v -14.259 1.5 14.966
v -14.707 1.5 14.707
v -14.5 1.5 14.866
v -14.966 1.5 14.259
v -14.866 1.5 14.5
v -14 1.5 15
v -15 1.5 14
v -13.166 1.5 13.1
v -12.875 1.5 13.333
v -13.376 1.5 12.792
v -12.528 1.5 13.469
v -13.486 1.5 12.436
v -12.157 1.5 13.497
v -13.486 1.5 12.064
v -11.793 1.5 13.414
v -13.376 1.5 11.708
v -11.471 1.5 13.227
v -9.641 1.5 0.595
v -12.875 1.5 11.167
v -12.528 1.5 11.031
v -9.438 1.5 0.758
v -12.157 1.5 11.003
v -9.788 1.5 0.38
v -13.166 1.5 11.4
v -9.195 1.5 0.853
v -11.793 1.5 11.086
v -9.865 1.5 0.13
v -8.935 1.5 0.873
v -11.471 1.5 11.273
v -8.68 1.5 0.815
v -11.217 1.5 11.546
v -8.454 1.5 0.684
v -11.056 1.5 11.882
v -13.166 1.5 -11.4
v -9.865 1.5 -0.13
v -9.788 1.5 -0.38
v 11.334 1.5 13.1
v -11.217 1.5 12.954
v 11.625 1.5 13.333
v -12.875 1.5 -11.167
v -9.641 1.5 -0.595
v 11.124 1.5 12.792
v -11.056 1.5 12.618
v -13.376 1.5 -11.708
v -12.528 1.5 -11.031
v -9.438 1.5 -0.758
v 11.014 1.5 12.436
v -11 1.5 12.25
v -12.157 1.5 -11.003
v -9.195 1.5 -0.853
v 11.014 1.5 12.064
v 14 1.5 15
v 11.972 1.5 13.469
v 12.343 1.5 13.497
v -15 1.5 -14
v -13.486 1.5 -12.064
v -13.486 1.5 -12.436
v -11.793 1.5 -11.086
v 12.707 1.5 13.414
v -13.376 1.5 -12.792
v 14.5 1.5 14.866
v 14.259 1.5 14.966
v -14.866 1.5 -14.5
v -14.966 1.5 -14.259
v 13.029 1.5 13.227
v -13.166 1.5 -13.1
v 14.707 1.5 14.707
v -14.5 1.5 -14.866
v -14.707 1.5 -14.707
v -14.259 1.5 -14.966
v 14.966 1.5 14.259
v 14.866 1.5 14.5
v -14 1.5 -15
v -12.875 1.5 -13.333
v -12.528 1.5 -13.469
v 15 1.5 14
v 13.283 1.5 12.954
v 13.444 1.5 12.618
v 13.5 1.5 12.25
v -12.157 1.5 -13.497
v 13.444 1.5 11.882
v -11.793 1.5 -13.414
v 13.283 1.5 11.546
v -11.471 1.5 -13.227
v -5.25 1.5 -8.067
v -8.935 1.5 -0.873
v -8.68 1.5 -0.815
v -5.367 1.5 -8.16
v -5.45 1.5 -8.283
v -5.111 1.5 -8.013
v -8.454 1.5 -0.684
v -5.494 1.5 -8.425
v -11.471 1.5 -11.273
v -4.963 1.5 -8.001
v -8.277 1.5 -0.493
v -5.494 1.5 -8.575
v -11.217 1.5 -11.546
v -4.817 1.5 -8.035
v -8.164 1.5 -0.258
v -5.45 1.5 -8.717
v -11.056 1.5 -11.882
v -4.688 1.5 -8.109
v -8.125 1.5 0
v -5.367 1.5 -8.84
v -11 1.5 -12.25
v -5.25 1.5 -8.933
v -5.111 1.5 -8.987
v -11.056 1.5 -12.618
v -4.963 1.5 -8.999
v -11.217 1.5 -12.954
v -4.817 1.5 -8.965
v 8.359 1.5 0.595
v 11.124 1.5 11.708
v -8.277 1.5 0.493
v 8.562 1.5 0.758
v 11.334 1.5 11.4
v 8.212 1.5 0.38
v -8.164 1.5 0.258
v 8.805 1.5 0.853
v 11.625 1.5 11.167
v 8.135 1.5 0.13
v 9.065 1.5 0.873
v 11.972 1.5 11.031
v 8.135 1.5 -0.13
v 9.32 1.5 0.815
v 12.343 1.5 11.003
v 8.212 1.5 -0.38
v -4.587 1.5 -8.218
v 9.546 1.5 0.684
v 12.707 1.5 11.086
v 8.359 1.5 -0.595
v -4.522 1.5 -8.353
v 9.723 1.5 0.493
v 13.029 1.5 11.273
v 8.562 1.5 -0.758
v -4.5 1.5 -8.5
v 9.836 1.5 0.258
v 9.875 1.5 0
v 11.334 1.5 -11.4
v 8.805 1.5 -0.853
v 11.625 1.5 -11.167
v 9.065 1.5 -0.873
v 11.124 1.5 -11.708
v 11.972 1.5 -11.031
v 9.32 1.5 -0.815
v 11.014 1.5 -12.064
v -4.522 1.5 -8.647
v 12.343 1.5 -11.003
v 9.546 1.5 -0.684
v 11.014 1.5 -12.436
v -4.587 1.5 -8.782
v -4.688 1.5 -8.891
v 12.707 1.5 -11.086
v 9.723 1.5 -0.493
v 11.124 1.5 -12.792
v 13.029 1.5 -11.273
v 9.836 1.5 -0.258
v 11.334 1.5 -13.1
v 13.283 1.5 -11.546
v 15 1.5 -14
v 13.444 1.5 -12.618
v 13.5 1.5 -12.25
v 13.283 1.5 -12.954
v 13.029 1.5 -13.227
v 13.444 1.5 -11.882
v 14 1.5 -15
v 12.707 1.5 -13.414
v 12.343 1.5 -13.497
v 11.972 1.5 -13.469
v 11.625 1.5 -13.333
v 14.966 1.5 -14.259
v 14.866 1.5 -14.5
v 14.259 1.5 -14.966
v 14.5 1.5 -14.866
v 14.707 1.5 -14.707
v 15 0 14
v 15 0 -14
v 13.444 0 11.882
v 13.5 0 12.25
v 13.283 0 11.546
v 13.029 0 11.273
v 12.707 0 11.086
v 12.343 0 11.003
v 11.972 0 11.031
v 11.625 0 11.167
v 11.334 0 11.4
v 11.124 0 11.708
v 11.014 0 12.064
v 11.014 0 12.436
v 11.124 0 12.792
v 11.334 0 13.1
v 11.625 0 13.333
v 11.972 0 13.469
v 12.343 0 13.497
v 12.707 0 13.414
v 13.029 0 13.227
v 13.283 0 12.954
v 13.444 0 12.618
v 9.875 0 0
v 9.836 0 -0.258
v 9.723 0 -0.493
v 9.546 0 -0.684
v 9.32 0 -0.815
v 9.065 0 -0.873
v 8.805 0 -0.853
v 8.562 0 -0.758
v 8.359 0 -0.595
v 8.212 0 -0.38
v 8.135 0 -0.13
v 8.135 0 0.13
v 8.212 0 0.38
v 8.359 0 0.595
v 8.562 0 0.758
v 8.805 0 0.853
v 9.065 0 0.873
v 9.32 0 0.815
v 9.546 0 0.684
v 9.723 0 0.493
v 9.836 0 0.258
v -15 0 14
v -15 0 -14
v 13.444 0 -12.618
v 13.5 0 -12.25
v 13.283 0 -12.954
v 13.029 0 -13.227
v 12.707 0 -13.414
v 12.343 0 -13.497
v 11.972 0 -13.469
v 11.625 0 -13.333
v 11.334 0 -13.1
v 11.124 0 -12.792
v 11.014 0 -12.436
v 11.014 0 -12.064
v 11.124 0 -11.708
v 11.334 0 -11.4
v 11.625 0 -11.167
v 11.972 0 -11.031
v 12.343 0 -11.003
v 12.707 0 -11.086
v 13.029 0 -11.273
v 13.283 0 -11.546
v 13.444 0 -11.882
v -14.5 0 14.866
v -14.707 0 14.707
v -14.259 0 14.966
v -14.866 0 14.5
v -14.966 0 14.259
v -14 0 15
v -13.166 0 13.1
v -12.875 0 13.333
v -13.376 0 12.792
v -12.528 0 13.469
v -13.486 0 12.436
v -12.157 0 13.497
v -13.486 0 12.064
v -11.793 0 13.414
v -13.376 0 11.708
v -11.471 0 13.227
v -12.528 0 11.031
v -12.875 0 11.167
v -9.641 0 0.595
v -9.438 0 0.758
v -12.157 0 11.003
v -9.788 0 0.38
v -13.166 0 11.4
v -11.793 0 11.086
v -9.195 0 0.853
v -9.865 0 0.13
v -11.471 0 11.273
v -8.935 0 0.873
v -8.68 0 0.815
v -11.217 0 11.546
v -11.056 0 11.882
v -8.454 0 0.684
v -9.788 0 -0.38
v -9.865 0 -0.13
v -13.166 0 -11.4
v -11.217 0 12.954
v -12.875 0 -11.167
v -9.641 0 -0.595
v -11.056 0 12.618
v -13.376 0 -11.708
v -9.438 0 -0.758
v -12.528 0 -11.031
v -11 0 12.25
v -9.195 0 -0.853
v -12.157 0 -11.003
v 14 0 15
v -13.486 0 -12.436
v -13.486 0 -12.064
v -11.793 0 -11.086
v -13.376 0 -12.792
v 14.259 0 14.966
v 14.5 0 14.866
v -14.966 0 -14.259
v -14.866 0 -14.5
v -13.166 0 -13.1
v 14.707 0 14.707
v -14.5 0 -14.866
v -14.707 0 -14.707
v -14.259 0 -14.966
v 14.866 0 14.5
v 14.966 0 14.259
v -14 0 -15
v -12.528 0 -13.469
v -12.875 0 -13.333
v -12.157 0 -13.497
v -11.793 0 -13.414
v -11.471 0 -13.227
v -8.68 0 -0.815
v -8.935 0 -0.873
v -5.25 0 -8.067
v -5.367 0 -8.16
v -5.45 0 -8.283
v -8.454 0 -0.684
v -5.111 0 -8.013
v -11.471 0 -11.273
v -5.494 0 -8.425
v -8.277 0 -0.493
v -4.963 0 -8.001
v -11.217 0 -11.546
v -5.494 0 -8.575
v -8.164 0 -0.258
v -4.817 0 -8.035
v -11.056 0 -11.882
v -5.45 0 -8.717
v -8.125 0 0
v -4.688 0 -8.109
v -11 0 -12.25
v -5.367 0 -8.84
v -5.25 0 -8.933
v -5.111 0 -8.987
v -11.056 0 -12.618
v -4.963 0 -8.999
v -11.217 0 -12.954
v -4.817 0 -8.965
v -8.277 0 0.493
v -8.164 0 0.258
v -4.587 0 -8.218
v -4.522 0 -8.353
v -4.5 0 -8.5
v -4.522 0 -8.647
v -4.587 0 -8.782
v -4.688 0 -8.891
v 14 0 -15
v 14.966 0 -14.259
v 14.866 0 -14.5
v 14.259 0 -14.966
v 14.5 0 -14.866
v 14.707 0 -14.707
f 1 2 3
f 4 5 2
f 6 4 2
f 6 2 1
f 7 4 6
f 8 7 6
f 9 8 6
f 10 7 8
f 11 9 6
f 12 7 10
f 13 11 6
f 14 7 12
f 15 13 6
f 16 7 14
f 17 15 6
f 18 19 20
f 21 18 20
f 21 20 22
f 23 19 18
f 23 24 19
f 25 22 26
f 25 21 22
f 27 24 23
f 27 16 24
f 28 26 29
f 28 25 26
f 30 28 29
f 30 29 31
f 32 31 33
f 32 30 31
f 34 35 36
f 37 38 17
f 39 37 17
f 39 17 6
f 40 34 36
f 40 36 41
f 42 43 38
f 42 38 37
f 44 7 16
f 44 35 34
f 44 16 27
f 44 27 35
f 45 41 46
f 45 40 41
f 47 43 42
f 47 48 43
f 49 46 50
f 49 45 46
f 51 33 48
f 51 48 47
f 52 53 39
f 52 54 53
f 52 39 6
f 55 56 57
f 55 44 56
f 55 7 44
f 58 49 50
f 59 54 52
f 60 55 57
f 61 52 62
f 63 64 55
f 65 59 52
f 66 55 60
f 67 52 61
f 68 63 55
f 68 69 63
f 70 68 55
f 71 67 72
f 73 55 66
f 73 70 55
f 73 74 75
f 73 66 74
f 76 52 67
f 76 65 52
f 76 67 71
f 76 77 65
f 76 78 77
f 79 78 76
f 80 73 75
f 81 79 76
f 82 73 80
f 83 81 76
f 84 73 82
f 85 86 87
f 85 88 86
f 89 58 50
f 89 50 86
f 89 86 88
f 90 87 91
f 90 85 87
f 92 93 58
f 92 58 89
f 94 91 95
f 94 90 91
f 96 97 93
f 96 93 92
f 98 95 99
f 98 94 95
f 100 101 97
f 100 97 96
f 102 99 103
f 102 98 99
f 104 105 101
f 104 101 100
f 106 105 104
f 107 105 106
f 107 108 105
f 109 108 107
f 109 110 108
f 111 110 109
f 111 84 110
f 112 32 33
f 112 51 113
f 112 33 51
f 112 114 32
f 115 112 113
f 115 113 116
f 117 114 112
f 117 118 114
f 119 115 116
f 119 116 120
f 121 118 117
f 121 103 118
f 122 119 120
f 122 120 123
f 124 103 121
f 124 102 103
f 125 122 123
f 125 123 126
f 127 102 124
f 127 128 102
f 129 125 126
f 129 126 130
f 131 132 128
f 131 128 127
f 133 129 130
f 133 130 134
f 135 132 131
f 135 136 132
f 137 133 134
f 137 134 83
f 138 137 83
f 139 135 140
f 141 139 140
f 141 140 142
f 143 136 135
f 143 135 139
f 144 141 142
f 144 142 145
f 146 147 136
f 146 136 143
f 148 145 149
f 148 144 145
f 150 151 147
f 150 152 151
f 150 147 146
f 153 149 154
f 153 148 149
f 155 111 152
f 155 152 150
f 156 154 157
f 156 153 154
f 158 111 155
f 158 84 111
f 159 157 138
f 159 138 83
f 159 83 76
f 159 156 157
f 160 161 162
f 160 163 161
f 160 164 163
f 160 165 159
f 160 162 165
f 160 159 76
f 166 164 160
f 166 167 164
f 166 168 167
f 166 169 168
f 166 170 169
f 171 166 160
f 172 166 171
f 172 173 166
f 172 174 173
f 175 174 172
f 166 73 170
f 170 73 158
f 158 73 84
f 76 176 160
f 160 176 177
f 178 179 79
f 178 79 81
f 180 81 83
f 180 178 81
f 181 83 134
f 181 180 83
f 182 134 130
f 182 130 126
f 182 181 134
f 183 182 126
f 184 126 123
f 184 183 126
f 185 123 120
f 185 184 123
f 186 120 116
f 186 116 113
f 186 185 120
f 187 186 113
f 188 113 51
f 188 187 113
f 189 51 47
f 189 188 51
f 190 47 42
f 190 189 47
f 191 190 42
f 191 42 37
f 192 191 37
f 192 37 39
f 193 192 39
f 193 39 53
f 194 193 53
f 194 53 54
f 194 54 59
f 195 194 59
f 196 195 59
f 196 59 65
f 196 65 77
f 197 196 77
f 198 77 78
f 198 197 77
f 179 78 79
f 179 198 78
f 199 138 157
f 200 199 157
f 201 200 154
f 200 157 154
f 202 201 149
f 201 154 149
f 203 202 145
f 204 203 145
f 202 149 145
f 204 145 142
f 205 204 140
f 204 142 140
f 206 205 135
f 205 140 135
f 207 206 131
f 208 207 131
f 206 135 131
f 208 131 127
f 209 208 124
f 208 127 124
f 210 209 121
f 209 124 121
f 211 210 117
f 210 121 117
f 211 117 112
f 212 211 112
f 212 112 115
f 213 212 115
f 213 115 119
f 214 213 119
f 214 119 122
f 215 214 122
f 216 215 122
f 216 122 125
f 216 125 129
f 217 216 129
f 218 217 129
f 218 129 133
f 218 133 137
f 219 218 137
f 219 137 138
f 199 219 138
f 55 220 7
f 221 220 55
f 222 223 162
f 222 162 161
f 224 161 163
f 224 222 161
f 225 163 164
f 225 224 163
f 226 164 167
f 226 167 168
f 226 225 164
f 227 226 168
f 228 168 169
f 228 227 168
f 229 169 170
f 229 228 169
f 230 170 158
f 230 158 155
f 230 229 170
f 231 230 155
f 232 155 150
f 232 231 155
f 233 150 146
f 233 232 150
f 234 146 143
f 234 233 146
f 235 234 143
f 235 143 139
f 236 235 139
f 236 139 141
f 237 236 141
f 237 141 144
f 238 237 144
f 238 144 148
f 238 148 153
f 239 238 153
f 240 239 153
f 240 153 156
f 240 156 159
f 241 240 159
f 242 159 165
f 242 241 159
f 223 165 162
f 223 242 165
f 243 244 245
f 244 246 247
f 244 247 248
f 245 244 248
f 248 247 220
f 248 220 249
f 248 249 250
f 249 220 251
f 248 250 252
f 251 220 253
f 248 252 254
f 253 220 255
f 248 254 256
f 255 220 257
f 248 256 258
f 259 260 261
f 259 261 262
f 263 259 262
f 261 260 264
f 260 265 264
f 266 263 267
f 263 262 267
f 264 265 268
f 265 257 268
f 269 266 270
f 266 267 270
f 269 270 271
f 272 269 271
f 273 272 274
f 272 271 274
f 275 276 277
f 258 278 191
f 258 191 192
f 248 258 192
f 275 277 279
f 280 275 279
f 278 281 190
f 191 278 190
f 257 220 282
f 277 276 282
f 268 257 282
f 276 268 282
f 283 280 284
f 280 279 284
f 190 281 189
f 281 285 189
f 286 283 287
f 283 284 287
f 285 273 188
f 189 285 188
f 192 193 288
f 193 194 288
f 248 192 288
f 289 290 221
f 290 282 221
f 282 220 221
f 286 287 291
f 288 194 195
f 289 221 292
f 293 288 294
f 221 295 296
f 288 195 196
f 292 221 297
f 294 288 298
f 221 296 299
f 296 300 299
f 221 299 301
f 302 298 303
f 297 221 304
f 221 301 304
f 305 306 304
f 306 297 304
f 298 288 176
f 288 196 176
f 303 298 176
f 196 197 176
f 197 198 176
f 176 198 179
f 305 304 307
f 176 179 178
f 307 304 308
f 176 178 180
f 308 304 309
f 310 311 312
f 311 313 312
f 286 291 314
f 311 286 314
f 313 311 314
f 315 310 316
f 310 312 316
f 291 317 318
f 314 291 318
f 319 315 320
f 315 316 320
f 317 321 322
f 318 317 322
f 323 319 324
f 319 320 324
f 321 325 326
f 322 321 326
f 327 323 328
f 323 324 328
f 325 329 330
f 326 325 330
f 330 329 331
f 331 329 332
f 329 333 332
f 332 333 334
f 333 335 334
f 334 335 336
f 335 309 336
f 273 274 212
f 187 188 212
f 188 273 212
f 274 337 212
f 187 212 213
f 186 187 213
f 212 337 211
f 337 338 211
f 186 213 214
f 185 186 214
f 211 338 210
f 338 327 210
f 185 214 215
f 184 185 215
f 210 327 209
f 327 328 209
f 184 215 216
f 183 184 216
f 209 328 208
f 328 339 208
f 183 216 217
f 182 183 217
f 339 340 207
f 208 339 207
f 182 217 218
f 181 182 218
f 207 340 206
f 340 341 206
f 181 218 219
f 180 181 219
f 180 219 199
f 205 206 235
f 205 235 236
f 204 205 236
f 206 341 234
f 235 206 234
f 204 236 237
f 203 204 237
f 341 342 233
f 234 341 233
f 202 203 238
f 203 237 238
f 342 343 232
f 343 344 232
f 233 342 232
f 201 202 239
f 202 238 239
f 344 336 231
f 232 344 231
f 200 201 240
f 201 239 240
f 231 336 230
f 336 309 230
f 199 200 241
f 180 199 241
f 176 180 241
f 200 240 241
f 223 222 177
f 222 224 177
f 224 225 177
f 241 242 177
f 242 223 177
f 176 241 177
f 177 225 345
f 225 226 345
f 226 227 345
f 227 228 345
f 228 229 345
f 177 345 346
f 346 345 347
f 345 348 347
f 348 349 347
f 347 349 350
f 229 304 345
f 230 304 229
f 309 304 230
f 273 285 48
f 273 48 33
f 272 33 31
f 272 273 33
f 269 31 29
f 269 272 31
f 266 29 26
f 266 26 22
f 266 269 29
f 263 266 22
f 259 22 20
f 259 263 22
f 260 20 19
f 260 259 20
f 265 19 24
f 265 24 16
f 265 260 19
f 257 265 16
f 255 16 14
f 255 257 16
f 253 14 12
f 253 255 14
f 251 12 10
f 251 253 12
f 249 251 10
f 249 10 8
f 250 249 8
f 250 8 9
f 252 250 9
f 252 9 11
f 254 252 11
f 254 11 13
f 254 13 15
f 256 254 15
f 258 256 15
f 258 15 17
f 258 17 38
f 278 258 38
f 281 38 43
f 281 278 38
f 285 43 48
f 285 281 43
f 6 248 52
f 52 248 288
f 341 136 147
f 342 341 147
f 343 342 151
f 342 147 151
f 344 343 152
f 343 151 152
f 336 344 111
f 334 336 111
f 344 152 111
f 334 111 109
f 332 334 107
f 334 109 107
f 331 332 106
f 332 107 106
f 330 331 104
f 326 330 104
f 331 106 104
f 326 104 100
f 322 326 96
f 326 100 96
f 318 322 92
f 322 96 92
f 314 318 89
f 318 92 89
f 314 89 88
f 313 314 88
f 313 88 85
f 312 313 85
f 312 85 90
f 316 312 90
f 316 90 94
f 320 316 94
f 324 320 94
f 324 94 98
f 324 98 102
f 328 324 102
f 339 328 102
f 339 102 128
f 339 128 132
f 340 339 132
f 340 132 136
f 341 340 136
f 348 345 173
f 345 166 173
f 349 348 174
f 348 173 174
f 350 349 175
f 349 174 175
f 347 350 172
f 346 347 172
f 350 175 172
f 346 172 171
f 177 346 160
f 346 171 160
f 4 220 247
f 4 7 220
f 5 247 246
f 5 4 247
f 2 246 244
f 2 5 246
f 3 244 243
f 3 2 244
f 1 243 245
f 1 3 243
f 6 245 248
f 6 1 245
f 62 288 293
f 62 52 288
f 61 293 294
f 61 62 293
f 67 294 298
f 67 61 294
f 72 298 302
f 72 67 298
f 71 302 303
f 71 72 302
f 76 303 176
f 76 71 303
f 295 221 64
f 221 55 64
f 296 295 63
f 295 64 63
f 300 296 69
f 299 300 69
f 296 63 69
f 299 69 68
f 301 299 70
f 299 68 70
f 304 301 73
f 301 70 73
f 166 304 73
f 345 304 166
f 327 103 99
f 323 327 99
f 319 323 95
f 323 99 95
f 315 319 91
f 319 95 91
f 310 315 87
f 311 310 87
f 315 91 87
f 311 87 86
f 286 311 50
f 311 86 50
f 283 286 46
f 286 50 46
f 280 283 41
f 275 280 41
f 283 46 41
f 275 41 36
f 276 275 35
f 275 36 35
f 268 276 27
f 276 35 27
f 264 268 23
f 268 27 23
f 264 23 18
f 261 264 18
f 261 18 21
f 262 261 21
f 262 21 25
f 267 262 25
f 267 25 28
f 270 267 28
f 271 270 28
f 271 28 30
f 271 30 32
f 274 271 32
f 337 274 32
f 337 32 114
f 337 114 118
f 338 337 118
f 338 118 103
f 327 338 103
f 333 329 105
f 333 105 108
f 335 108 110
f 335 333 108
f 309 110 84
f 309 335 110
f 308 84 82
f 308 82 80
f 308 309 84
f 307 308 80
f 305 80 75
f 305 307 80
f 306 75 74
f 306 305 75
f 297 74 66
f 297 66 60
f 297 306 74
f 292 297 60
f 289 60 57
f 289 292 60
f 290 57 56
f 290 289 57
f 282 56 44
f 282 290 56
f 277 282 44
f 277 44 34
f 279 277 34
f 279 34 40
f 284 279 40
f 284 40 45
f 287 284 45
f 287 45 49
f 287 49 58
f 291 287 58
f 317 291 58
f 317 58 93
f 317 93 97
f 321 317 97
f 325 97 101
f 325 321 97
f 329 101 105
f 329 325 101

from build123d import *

# Parameters (mm, degrees)
SKETCH1_W           = 30
SKETCH1_H           = 30
SKETCH1_R           = 1.25
BOSS_EXTRUDE1_DEPTH = 1.5
FILLET1_R           = 1
SKETCH2_R           = 0.5
SKETCH2_R_2         = 0.875
CUT_EXTRUDE1_DEPTH  = 2.5


with BuildPart() as part:
    # Sketch1 → Boss-Extrude1 (new body)
    with BuildSketch(Plane(origin=(0, 0, 0), x_dir=(1, 0, 0), z_dir=(0, 1, 0))):
        Rectangle(SKETCH1_W, SKETCH1_H)
        with Locations((-12.25, 12.25)):
            Circle(SKETCH1_R, mode=Mode.SUBTRACT)
        with Locations((12.25, 12.25)):
            Circle(SKETCH1_R, mode=Mode.SUBTRACT)
        with Locations((12.25, -12.25)):
            Circle(SKETCH1_R, mode=Mode.SUBTRACT)
        with Locations((-12.25, -12.25)):
            Circle(SKETCH1_R, mode=Mode.SUBTRACT)
    extrude(amount=BOSS_EXTRUDE1_DEPTH)

    # Fillet1
    fillet1_edges = [part.edges().sort_by_distance(p)[0] for p in [
        (-15, 0.75, -15),
        (15, 0.75, -15),
        (15, 0.75, 15),
        (-15, 0.75, 15),
    ]]
    fillet(fillet1_edges, radius=FILLET1_R)

    # Sketch2 → Cut-Extrude1 (cut, through all)
    with BuildSketch(Plane(origin=(0, 1.5, 0), x_dir=(1, 0, 0), z_dir=(0, 1, 0))):
        with Locations((-5, 8.5)):
            Circle(SKETCH2_R)
        with Locations((-9, 0)):
            Circle(SKETCH2_R_2)
        with Locations((9, 0)):
            Circle(SKETCH2_R_2)
    extrude(amount=-CUT_EXTRUDE1_DEPTH, mode=Mode.SUBTRACT)


solid = part.part
